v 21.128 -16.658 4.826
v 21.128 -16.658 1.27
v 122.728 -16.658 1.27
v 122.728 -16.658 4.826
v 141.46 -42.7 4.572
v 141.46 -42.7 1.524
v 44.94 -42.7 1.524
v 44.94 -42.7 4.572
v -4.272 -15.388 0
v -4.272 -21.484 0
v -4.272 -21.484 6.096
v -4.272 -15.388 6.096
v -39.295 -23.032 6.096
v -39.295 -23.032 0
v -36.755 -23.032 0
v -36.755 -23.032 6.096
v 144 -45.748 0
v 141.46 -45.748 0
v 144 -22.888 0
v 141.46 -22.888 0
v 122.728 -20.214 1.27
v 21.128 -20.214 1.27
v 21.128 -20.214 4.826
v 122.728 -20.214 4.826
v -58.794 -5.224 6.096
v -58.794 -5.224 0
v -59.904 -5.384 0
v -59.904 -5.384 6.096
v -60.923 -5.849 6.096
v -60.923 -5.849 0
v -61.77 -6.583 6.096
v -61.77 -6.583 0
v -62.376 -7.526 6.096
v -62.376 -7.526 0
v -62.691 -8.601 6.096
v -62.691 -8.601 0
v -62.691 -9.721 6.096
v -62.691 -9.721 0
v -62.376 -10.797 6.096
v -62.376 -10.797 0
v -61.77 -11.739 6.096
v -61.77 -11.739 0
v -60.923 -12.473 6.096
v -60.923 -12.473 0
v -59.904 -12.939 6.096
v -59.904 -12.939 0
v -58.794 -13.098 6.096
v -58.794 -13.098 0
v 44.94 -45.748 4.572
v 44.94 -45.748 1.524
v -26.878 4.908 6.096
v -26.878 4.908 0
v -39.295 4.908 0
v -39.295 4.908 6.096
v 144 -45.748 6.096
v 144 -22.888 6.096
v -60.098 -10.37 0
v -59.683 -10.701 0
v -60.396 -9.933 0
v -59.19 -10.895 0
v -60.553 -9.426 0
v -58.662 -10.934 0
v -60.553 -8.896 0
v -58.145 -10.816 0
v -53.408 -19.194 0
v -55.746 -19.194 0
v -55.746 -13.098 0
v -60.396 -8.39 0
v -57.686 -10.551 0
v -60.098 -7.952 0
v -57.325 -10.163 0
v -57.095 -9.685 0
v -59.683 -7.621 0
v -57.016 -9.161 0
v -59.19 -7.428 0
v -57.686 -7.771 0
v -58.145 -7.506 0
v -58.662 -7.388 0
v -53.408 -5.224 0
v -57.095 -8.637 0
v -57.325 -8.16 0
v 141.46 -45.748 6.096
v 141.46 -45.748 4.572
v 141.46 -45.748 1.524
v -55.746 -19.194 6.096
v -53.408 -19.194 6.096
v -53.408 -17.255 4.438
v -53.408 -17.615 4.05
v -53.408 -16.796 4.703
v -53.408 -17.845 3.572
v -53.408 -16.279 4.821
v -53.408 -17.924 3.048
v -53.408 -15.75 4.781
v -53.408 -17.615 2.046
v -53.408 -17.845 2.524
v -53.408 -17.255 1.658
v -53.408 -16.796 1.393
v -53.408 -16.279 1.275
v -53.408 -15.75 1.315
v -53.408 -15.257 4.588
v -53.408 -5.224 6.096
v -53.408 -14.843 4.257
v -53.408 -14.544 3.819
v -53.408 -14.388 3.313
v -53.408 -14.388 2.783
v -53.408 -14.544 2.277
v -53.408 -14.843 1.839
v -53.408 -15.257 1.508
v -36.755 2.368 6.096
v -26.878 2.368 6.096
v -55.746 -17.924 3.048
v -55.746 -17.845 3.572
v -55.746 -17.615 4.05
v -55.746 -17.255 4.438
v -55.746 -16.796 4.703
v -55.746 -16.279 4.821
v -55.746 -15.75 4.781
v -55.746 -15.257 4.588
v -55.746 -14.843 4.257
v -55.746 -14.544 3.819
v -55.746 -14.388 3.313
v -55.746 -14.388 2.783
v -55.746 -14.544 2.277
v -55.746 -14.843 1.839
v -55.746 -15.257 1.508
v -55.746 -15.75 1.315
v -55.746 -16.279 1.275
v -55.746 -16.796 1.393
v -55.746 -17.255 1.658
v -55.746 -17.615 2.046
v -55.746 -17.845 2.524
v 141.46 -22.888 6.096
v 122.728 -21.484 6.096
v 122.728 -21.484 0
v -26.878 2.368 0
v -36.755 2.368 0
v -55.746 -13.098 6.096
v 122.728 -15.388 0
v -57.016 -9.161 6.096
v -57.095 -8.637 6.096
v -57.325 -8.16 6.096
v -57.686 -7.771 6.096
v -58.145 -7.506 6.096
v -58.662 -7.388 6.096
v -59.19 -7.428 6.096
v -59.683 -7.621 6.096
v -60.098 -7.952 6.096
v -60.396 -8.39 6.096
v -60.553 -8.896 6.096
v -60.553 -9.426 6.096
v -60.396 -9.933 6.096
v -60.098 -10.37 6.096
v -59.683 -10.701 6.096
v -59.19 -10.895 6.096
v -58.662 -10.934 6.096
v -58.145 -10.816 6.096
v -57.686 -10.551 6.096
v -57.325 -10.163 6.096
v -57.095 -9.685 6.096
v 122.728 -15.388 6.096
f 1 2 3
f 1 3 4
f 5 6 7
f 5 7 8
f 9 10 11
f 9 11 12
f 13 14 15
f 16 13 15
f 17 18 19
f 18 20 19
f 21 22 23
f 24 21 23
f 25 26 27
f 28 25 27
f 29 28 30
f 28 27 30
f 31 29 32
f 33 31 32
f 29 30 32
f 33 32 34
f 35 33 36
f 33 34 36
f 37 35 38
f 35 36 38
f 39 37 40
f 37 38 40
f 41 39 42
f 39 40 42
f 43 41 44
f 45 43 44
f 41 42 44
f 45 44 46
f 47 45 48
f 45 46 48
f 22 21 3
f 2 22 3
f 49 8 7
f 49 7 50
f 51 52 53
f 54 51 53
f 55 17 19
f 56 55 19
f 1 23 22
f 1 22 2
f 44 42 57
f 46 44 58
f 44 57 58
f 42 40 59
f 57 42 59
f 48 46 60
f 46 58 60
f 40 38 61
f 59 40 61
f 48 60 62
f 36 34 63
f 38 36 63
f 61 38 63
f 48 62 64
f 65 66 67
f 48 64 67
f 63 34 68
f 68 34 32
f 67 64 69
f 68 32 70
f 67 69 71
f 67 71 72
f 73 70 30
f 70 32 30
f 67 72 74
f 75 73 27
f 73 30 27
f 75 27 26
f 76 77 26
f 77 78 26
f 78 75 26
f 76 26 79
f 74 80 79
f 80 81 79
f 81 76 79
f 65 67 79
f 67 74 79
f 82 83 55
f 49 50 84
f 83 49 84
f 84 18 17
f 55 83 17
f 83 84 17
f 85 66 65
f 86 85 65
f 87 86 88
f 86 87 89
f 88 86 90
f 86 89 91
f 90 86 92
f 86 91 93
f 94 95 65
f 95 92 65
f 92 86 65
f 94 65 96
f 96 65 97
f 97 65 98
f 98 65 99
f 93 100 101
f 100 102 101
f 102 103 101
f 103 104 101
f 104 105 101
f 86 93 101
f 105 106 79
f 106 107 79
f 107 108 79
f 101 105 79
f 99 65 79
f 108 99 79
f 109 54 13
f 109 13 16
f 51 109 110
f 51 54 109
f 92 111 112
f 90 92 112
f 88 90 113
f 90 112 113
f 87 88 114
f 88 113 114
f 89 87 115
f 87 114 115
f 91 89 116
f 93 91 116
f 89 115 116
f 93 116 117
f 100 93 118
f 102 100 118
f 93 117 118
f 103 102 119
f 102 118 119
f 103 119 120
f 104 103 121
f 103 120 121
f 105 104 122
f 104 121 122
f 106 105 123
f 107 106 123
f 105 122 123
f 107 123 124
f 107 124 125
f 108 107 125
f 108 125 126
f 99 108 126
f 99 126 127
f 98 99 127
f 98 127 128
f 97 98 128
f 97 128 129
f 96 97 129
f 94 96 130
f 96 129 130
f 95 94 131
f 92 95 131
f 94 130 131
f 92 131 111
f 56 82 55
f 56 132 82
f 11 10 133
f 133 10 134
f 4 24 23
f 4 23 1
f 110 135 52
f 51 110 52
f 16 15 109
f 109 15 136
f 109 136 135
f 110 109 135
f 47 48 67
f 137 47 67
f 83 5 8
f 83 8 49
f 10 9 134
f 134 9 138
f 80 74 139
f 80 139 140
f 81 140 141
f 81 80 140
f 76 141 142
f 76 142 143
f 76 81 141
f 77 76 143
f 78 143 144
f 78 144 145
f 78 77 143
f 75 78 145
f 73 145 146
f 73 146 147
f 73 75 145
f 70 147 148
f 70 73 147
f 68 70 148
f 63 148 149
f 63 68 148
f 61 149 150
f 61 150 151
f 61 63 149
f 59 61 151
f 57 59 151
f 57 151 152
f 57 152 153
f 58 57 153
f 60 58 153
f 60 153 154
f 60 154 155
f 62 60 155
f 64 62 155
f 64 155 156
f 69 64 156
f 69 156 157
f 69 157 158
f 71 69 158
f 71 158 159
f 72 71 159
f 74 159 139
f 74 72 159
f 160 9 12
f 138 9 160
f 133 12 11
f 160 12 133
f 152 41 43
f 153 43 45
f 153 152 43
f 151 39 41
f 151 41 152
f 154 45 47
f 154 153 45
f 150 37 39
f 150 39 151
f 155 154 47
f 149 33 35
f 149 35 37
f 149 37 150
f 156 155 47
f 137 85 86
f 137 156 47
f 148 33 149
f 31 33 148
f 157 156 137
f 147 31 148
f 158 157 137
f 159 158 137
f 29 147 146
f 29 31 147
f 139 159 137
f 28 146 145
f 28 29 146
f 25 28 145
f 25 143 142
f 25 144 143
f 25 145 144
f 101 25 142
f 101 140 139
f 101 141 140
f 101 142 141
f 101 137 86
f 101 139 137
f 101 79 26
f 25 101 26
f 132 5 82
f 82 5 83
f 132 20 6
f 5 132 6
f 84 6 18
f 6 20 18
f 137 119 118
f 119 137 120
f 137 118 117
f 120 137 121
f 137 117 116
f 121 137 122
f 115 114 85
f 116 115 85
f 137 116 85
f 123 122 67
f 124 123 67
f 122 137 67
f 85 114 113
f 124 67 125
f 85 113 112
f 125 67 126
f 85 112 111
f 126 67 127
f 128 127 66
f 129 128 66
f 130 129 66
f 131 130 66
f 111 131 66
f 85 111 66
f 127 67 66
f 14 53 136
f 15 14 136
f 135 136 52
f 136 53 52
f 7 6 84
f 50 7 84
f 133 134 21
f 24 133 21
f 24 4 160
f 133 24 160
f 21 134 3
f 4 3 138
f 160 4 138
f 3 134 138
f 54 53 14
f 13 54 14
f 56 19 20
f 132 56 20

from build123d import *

# Parameters (mm, degrees)
F1_DEPTH  = 6.096
F2_W      = 127
F2_H      = 6.096
F3_DEPTH  = 6.096
F4_W      = 3.556
F4_H      = 3.556
F5_DEPTH  = 101.6
F7_DEPTH  = 6.096
F8_W      = 3.048
F8_H      = 3.048
F9_DEPTH  = 96.52
F10_R     = 1.778
F11_DEPTH = 6.096
F12_R     = 1.778
F13_DEPTH = 2.33841


with BuildPart() as f1:
    # F0 (on Top) → F1 (new body)
    with BuildSketch(Plane.XY):
        Polygon((-26.877569, 2.36775), (-26.877569, 4.90775), (-39.295337, 4.90775), (-39.295337, -23.03225), (-36.755337, -23.03225), (-36.755337, 2.36775), align=None)
    extrude(amount=F1_DEPTH)


with BuildPart() as f3:
    # F2 (on Top) → F3 (new body)
    with BuildSketch(Plane.XY):
        with Locations((59.228293, -18.435688)):
            Rectangle(F2_W, F2_H)
    extrude(amount=F3_DEPTH)

    # F4 (on face) → F5 (cut)
    with BuildSketch(Plane.YZ.offset(122.728293)):
        with Locations((-18.435688, 3.048)):
            Rectangle(F4_W, F4_H)
    extrude(amount=-F5_DEPTH, mode=Mode.SUBTRACT)


with BuildPart() as f7:
    # F6 (on Top) → F7 (new body)
    with BuildSketch(Plane.XY):
        Polygon((141.459931, -25.428247), (141.459931, -45.748247), (143.999931, -45.748247), (143.999931, -22.888247), (141.459931, -22.888247), align=None)
    extrude(amount=F7_DEPTH)

    # F8 (on face) → F9 (join)
    with BuildSketch(Plane(origin=(141.459931, 0, 0), x_dir=(0, -1, 0), z_dir=(-1, 0, 0))):
        with Locations((44.224247, 3.048)):
            Rectangle(F8_W, F8_H)
    extrude(amount=F9_DEPTH)


with BuildPart() as f11:
    # F10 (on Top) → F11 (new body)
    with BuildSketch(Plane.XY):
        Polygon((-55.746437, -19.194109), (-53.408027, -19.194109), (-53.408027, -5.224109), (-55.746437, -5.224109), (-55.746437, -13.098109), align=None)
        with BuildLine():
            Line((-58.794437, -13.098109), (-55.746437, -13.098109))
            Line((-55.746437, -13.098109), (-55.746437, -5.224109))
            Line((-55.746437, -5.224109), (-58.794437, -5.224109))
            ThreePointArc((-58.794437, -5.224109), (-62.731437, -9.161109), (-58.794437, -13.098109))
        make_face()
        with Locations((-58.794437, -9.161109)):
            Circle(F10_R, mode=Mode.SUBTRACT)
    extrude(amount=F11_DEPTH)

    # F12 (on face) → F13 (cut, through all)
    with BuildSketch(Plane(origin=(-55.746437, 0, 0), x_dir=(0, -1, 0), z_dir=(-1, 0, 0))):
        with Locations((16.146109, 3.048)):
            Circle(F12_R)
    extrude(amount=-F13_DEPTH, mode=Mode.SUBTRACT)


solid = Compound([f1.part, f3.part, f7.part, f11.part])
